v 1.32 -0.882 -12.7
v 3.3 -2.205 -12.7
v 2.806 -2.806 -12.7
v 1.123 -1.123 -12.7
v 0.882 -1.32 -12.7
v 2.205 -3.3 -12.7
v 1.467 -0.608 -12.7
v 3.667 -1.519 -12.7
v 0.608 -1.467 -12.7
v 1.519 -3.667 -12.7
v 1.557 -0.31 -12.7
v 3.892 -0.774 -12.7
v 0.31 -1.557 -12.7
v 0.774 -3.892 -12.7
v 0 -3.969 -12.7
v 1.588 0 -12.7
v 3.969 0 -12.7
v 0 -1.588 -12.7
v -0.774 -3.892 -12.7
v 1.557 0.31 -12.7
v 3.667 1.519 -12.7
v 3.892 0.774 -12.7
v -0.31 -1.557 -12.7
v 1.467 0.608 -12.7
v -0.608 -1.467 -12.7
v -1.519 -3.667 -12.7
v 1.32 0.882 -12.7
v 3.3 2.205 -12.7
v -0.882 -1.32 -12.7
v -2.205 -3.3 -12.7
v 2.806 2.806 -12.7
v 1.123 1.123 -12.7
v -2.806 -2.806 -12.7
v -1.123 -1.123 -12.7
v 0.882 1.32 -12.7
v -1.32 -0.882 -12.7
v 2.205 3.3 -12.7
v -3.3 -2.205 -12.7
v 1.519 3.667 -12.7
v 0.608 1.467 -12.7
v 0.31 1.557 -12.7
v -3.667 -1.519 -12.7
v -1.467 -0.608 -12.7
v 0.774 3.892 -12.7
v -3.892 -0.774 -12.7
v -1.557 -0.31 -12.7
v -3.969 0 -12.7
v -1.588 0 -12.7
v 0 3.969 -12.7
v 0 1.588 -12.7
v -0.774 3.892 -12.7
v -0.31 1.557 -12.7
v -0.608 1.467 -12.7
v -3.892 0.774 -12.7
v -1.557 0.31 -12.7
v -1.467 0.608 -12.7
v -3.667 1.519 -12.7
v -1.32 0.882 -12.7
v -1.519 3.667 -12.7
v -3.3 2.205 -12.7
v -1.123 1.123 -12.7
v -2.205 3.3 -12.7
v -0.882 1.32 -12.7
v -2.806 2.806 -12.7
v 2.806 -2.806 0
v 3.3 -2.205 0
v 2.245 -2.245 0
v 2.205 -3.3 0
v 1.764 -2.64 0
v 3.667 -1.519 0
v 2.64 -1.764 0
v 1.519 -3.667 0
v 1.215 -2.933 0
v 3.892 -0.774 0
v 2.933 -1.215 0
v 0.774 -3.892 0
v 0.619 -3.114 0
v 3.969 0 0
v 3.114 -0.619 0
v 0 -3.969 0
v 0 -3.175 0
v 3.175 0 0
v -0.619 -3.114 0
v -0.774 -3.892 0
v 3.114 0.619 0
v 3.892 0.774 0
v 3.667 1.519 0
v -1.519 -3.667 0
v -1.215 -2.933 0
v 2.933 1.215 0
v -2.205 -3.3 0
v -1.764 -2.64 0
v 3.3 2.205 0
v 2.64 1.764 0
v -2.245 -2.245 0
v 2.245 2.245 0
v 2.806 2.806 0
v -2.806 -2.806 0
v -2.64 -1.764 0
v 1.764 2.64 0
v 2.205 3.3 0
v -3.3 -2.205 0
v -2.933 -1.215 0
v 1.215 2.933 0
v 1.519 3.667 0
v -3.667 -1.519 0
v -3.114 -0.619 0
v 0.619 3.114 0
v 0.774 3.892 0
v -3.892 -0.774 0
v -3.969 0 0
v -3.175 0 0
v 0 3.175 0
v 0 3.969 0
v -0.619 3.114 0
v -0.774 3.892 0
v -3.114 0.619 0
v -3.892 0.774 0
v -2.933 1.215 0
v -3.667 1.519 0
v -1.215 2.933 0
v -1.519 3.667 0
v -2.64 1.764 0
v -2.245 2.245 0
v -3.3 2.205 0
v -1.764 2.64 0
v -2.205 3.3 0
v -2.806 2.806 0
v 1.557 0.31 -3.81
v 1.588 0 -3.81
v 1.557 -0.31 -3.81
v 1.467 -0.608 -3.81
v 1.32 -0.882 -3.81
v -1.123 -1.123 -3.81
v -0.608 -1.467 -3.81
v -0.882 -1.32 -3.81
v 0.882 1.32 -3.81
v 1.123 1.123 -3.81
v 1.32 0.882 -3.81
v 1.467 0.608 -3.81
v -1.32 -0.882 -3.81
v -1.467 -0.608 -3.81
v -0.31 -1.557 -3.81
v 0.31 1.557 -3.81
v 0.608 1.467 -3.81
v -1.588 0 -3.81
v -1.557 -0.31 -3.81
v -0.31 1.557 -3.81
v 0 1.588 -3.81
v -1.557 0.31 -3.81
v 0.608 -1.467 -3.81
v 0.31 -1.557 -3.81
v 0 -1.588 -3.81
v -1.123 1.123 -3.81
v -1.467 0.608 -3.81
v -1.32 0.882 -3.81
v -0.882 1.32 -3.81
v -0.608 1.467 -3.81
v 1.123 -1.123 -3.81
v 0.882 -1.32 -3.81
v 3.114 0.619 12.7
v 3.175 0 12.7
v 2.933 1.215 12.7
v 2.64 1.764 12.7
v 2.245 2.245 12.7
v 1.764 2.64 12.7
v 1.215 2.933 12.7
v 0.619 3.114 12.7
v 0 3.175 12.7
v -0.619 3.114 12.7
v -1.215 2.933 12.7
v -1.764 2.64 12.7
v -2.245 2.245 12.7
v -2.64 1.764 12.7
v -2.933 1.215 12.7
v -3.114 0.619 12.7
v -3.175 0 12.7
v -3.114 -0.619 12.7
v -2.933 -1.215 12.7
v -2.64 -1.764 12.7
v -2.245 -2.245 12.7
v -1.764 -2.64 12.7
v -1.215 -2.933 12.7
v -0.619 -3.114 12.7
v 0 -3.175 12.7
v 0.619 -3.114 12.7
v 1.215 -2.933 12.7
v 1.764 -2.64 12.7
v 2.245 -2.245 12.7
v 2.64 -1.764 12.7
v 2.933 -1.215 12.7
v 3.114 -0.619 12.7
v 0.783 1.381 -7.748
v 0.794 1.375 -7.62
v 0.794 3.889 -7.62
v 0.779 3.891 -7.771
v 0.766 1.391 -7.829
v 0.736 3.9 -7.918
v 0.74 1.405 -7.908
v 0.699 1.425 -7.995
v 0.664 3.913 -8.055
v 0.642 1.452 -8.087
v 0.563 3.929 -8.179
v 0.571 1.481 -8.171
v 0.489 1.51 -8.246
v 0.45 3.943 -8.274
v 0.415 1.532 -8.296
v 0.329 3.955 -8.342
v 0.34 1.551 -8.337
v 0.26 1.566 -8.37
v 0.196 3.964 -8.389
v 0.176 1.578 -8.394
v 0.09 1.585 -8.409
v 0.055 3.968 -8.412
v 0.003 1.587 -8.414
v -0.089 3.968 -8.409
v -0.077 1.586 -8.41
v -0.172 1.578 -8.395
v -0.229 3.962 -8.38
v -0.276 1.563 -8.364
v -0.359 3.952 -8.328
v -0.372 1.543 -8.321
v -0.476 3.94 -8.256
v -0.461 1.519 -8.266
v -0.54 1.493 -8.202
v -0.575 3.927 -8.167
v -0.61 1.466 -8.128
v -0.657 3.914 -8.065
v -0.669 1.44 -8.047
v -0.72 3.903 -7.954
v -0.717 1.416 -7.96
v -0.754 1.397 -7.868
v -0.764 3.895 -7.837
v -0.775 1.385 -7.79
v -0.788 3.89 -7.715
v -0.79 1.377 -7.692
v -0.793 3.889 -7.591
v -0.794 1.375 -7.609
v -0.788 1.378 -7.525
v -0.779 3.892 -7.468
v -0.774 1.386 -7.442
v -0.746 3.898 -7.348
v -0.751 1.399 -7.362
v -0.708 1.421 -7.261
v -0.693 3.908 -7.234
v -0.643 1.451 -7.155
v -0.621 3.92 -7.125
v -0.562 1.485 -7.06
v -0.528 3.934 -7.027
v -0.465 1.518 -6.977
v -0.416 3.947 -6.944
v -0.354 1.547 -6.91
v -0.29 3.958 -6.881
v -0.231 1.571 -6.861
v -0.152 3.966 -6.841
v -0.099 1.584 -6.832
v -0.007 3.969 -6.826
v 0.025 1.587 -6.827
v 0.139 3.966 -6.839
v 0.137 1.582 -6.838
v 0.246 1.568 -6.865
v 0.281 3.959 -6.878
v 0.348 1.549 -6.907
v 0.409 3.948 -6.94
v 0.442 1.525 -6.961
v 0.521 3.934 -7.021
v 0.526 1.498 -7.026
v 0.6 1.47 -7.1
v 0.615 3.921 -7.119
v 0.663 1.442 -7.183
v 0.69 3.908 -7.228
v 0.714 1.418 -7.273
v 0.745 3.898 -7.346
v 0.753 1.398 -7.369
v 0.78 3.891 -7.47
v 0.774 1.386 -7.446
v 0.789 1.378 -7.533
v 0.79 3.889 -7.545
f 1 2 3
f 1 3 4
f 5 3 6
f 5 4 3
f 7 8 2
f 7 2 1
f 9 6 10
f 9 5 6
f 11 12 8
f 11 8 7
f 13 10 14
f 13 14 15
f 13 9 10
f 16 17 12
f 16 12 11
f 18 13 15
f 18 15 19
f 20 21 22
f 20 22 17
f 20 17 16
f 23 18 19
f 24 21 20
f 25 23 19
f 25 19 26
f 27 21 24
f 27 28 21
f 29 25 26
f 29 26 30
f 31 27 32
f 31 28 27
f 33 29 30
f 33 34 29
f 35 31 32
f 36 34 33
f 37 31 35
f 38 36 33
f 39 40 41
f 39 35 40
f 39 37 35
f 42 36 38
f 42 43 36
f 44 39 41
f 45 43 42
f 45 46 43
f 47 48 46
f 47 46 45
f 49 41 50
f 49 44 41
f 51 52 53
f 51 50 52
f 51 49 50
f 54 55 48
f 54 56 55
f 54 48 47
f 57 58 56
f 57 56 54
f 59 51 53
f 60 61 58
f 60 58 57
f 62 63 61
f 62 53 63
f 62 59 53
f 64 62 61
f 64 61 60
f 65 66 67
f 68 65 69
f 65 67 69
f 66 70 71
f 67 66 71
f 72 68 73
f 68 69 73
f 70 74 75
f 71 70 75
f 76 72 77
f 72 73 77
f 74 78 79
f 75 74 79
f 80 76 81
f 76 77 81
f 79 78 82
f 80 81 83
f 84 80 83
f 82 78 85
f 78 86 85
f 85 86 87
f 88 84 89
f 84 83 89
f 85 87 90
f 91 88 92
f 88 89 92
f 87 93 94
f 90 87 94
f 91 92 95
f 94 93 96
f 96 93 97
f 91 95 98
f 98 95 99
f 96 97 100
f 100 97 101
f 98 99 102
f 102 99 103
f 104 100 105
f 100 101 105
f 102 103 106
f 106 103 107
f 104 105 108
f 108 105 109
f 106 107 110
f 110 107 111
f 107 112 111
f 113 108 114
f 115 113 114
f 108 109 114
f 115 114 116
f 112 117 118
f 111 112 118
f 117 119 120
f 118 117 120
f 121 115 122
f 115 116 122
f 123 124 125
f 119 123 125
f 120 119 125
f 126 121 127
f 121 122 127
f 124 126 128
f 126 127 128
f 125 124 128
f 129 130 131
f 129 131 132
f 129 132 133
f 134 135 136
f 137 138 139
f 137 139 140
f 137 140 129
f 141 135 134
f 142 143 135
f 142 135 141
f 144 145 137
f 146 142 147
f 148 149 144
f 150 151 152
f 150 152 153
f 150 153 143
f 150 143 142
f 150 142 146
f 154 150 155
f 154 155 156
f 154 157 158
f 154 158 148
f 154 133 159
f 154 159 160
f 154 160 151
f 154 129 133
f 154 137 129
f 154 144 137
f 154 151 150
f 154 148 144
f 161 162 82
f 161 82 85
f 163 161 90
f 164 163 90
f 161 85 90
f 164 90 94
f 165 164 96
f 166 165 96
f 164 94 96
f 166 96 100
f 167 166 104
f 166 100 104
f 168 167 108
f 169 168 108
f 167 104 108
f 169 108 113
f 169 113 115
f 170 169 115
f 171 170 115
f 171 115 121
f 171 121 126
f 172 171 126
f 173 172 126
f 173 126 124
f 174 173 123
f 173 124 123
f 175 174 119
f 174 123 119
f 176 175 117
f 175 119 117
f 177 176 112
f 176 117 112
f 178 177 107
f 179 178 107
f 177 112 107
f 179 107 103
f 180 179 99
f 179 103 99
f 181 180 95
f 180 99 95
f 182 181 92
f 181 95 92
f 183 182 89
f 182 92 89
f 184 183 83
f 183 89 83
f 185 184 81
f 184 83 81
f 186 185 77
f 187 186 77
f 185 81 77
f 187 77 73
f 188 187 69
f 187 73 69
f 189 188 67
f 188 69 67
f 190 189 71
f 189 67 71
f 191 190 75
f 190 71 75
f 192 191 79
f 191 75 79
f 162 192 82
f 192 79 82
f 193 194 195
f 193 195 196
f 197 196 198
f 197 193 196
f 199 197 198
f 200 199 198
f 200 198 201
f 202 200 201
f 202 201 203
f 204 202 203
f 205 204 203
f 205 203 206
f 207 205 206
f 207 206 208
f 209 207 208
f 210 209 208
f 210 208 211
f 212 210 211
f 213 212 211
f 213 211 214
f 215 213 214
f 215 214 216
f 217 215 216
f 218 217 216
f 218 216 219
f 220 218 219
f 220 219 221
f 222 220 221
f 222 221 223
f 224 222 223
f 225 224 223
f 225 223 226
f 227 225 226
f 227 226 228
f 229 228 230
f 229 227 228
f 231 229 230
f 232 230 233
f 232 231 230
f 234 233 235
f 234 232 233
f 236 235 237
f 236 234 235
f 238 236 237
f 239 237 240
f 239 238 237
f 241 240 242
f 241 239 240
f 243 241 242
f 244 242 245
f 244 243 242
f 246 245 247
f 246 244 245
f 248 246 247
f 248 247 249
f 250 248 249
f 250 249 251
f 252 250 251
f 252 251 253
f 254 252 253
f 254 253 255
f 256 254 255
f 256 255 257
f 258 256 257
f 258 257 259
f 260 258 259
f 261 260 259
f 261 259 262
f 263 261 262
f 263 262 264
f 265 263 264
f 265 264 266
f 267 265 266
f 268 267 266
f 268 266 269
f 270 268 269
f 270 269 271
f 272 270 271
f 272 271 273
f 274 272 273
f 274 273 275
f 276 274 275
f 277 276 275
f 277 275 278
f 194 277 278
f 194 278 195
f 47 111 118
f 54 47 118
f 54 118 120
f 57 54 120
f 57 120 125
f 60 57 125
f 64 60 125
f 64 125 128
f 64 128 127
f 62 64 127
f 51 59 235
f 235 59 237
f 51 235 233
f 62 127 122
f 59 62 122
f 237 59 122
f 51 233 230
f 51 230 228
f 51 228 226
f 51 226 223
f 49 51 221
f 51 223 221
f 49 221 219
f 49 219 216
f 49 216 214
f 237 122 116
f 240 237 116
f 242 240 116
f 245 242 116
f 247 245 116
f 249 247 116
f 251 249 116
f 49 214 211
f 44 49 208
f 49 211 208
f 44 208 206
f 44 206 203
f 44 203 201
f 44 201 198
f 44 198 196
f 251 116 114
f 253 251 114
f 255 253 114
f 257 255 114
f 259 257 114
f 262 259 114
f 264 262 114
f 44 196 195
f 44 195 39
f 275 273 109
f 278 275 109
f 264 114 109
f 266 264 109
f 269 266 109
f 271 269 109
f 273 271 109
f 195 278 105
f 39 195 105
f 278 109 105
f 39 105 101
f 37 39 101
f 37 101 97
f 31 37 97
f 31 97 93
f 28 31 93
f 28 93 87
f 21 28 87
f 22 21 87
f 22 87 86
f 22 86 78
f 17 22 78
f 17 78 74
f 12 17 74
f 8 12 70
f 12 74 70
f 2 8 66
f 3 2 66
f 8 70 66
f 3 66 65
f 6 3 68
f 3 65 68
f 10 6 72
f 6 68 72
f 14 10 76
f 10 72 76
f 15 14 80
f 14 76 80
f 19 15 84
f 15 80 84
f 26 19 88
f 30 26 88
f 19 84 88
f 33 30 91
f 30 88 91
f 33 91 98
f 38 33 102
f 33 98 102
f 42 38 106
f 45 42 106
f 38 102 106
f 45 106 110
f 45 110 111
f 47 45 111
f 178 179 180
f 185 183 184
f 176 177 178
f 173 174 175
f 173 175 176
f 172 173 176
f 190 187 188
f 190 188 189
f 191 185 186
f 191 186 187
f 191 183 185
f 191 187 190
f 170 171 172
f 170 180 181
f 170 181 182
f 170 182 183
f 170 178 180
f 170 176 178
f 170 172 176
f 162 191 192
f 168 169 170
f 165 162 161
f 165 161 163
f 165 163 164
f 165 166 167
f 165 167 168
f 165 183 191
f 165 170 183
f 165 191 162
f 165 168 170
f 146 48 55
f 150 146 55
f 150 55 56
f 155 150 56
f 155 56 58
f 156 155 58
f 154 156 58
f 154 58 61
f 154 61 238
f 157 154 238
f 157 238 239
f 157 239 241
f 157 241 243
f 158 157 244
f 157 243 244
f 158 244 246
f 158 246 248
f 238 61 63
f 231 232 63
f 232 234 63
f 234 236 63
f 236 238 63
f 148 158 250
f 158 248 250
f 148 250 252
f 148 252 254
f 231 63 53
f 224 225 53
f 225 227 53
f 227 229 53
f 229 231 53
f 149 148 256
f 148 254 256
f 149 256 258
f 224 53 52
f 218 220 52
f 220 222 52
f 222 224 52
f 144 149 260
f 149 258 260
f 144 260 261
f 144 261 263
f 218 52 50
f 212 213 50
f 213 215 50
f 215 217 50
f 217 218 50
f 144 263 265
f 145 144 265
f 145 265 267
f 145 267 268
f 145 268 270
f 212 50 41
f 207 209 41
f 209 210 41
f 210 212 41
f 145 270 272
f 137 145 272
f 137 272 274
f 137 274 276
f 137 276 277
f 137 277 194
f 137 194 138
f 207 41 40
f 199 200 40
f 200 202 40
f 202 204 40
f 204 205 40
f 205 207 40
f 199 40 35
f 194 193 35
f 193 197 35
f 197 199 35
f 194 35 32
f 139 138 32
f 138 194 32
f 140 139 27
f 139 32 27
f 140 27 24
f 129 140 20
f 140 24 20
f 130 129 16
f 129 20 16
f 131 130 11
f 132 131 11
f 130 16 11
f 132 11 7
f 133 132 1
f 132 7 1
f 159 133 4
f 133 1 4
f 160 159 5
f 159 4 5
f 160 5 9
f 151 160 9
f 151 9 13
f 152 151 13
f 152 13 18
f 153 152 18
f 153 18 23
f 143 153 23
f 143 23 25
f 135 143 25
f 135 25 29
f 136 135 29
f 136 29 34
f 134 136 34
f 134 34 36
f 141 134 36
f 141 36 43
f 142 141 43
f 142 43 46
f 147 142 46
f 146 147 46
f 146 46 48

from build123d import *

# Parameters (mm, degrees)
SKETCH1_R           = 3.175
BOSS_EXTRUDE1_DEPTH = 12.7
SKETCH3_R           = 3.96875
BOSS_EXTRUDE2_DEPTH = 12.7
SKETCH4_R           = 1.5875
CUT_EXTRUDE2_DEPTH  = 8.89
SKETCH5_R           = 0.79375
CUT_EXTRUDE3_DEPTH  = 4.96875


with BuildPart() as part:
    # Sketch1 → Boss-Extrude1 (new body)
    with BuildSketch(Plane.XY):
        Circle(SKETCH1_R)
    extrude(amount=BOSS_EXTRUDE1_DEPTH)

    # Sketch3 → Boss-Extrude2 (add)
    with BuildSketch(Plane(origin=(0, 0, 0), x_dir=(-1, 0, 0), z_dir=(0, 0, -1))):
        Circle(SKETCH3_R)
    extrude(amount=BOSS_EXTRUDE2_DEPTH)

    # Sketch4 → Cut-Extrude2 (cut)
    with BuildSketch(Plane(origin=(0, 0, -12.7), x_dir=(-1, 0, 0), z_dir=(0, 0, -1))):
        Circle(SKETCH4_R)
    extrude(amount=-CUT_EXTRUDE2_DEPTH, mode=Mode.SUBTRACT)

    # Sketch5 → Cut-Extrude3 (cut, through all)
    with BuildSketch(Plane(origin=(0, 0, 0), x_dir=(1, 0, 0), z_dir=(0, 1, 0))):
        with Locations((0, 7.62)):
            Circle(SKETCH5_R)
    extrude(amount=CUT_EXTRUDE3_DEPTH, mode=Mode.SUBTRACT)


solid = part.part
